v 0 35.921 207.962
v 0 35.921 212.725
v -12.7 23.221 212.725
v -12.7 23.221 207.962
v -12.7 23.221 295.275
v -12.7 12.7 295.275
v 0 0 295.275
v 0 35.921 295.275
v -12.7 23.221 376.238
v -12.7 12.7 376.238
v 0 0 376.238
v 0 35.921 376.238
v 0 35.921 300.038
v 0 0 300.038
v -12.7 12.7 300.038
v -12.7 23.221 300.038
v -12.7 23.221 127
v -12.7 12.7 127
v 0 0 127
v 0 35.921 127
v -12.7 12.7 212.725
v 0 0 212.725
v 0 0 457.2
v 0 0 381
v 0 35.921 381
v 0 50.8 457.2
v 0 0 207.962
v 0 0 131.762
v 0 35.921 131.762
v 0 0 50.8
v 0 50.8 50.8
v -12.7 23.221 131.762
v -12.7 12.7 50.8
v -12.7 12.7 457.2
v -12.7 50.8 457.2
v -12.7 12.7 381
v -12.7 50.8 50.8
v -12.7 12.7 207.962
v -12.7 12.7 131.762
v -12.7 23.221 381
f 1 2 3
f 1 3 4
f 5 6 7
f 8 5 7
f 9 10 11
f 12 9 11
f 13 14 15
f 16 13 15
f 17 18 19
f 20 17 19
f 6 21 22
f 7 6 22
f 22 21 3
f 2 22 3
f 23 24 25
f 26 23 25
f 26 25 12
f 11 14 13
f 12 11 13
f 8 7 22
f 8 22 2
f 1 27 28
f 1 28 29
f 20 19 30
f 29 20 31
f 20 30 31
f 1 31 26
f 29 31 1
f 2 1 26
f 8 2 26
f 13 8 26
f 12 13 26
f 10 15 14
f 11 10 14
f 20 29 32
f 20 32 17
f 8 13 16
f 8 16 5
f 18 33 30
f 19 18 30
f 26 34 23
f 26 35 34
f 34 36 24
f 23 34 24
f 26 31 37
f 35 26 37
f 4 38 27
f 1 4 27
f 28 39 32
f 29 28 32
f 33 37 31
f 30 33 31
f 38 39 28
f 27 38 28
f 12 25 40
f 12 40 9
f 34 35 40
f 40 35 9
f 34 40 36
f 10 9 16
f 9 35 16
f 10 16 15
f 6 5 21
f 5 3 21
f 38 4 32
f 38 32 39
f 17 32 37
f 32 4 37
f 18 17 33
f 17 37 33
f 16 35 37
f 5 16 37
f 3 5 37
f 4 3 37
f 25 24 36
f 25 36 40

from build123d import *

# Parameters (mm, degrees)
F1_DEPTH = 457.2
F2_DEPTH = 50.8
F4_DEPTH = 35.922024


with BuildPart() as f1:
    # F0 (on Top) → F1 (new body)
    with BuildSketch(Plane.XY):
        Polygon((-12.7, 12.7), (0, 0), (0, 50.8), (-12.7, 50.8), align=None)
    extrude(amount=F1_DEPTH)

    # F1_face (on face) → F2 (cut)
    with BuildSketch(Plane(origin=(-6.047619, 28.42381, 0), x_dir=(1, 0, 0), z_dir=(0, 0, -1))):
        Polygon((6.047619, 28.42381), (-6.652381, 15.72381), (-6.652381, -22.37619), (6.047619, -22.37619), align=None)
        Polygon((-6.652381, 15.72381), (6.047619, 28.42381), (6.047619, -22.37619), (-6.652381, -22.37619), align=None)
    extrude(amount=-F2_DEPTH, mode=Mode.SUBTRACT)

    # F3 (on face) → F4 (cut, through all)
    with BuildSketch(Plane(origin=(0, 0, 0), x_dir=(0.707107, -0.707107, 0), z_dir=(-0.707107, -0.707107, 0))):
        Polygon((3.225248, 381), (0, 381), (-25.4, 381), (-25.4, 376.2375), (0, 376.2375), (3.225248, 376.2375), align=None)
        Polygon((5.052605, 300.0375), (0, 300.0375), (-25.4, 300.0375), (-25.4, 295.275), (5.052605, 295.275), align=None)
        Polygon((-25.4, 207.9625), (0, 207.9625), (8.918187, 207.9625), (8.918187, 212.725), (-25.4, 212.725), align=None)
        Polygon((-25.4, 127), (0, 127), (10.666735, 127), (10.666735, 131.7625), (0, 131.7625), (-25.4, 131.7625), align=None)
    extrude(amount=-F4_DEPTH, mode=Mode.SUBTRACT)


solid = f1.part
